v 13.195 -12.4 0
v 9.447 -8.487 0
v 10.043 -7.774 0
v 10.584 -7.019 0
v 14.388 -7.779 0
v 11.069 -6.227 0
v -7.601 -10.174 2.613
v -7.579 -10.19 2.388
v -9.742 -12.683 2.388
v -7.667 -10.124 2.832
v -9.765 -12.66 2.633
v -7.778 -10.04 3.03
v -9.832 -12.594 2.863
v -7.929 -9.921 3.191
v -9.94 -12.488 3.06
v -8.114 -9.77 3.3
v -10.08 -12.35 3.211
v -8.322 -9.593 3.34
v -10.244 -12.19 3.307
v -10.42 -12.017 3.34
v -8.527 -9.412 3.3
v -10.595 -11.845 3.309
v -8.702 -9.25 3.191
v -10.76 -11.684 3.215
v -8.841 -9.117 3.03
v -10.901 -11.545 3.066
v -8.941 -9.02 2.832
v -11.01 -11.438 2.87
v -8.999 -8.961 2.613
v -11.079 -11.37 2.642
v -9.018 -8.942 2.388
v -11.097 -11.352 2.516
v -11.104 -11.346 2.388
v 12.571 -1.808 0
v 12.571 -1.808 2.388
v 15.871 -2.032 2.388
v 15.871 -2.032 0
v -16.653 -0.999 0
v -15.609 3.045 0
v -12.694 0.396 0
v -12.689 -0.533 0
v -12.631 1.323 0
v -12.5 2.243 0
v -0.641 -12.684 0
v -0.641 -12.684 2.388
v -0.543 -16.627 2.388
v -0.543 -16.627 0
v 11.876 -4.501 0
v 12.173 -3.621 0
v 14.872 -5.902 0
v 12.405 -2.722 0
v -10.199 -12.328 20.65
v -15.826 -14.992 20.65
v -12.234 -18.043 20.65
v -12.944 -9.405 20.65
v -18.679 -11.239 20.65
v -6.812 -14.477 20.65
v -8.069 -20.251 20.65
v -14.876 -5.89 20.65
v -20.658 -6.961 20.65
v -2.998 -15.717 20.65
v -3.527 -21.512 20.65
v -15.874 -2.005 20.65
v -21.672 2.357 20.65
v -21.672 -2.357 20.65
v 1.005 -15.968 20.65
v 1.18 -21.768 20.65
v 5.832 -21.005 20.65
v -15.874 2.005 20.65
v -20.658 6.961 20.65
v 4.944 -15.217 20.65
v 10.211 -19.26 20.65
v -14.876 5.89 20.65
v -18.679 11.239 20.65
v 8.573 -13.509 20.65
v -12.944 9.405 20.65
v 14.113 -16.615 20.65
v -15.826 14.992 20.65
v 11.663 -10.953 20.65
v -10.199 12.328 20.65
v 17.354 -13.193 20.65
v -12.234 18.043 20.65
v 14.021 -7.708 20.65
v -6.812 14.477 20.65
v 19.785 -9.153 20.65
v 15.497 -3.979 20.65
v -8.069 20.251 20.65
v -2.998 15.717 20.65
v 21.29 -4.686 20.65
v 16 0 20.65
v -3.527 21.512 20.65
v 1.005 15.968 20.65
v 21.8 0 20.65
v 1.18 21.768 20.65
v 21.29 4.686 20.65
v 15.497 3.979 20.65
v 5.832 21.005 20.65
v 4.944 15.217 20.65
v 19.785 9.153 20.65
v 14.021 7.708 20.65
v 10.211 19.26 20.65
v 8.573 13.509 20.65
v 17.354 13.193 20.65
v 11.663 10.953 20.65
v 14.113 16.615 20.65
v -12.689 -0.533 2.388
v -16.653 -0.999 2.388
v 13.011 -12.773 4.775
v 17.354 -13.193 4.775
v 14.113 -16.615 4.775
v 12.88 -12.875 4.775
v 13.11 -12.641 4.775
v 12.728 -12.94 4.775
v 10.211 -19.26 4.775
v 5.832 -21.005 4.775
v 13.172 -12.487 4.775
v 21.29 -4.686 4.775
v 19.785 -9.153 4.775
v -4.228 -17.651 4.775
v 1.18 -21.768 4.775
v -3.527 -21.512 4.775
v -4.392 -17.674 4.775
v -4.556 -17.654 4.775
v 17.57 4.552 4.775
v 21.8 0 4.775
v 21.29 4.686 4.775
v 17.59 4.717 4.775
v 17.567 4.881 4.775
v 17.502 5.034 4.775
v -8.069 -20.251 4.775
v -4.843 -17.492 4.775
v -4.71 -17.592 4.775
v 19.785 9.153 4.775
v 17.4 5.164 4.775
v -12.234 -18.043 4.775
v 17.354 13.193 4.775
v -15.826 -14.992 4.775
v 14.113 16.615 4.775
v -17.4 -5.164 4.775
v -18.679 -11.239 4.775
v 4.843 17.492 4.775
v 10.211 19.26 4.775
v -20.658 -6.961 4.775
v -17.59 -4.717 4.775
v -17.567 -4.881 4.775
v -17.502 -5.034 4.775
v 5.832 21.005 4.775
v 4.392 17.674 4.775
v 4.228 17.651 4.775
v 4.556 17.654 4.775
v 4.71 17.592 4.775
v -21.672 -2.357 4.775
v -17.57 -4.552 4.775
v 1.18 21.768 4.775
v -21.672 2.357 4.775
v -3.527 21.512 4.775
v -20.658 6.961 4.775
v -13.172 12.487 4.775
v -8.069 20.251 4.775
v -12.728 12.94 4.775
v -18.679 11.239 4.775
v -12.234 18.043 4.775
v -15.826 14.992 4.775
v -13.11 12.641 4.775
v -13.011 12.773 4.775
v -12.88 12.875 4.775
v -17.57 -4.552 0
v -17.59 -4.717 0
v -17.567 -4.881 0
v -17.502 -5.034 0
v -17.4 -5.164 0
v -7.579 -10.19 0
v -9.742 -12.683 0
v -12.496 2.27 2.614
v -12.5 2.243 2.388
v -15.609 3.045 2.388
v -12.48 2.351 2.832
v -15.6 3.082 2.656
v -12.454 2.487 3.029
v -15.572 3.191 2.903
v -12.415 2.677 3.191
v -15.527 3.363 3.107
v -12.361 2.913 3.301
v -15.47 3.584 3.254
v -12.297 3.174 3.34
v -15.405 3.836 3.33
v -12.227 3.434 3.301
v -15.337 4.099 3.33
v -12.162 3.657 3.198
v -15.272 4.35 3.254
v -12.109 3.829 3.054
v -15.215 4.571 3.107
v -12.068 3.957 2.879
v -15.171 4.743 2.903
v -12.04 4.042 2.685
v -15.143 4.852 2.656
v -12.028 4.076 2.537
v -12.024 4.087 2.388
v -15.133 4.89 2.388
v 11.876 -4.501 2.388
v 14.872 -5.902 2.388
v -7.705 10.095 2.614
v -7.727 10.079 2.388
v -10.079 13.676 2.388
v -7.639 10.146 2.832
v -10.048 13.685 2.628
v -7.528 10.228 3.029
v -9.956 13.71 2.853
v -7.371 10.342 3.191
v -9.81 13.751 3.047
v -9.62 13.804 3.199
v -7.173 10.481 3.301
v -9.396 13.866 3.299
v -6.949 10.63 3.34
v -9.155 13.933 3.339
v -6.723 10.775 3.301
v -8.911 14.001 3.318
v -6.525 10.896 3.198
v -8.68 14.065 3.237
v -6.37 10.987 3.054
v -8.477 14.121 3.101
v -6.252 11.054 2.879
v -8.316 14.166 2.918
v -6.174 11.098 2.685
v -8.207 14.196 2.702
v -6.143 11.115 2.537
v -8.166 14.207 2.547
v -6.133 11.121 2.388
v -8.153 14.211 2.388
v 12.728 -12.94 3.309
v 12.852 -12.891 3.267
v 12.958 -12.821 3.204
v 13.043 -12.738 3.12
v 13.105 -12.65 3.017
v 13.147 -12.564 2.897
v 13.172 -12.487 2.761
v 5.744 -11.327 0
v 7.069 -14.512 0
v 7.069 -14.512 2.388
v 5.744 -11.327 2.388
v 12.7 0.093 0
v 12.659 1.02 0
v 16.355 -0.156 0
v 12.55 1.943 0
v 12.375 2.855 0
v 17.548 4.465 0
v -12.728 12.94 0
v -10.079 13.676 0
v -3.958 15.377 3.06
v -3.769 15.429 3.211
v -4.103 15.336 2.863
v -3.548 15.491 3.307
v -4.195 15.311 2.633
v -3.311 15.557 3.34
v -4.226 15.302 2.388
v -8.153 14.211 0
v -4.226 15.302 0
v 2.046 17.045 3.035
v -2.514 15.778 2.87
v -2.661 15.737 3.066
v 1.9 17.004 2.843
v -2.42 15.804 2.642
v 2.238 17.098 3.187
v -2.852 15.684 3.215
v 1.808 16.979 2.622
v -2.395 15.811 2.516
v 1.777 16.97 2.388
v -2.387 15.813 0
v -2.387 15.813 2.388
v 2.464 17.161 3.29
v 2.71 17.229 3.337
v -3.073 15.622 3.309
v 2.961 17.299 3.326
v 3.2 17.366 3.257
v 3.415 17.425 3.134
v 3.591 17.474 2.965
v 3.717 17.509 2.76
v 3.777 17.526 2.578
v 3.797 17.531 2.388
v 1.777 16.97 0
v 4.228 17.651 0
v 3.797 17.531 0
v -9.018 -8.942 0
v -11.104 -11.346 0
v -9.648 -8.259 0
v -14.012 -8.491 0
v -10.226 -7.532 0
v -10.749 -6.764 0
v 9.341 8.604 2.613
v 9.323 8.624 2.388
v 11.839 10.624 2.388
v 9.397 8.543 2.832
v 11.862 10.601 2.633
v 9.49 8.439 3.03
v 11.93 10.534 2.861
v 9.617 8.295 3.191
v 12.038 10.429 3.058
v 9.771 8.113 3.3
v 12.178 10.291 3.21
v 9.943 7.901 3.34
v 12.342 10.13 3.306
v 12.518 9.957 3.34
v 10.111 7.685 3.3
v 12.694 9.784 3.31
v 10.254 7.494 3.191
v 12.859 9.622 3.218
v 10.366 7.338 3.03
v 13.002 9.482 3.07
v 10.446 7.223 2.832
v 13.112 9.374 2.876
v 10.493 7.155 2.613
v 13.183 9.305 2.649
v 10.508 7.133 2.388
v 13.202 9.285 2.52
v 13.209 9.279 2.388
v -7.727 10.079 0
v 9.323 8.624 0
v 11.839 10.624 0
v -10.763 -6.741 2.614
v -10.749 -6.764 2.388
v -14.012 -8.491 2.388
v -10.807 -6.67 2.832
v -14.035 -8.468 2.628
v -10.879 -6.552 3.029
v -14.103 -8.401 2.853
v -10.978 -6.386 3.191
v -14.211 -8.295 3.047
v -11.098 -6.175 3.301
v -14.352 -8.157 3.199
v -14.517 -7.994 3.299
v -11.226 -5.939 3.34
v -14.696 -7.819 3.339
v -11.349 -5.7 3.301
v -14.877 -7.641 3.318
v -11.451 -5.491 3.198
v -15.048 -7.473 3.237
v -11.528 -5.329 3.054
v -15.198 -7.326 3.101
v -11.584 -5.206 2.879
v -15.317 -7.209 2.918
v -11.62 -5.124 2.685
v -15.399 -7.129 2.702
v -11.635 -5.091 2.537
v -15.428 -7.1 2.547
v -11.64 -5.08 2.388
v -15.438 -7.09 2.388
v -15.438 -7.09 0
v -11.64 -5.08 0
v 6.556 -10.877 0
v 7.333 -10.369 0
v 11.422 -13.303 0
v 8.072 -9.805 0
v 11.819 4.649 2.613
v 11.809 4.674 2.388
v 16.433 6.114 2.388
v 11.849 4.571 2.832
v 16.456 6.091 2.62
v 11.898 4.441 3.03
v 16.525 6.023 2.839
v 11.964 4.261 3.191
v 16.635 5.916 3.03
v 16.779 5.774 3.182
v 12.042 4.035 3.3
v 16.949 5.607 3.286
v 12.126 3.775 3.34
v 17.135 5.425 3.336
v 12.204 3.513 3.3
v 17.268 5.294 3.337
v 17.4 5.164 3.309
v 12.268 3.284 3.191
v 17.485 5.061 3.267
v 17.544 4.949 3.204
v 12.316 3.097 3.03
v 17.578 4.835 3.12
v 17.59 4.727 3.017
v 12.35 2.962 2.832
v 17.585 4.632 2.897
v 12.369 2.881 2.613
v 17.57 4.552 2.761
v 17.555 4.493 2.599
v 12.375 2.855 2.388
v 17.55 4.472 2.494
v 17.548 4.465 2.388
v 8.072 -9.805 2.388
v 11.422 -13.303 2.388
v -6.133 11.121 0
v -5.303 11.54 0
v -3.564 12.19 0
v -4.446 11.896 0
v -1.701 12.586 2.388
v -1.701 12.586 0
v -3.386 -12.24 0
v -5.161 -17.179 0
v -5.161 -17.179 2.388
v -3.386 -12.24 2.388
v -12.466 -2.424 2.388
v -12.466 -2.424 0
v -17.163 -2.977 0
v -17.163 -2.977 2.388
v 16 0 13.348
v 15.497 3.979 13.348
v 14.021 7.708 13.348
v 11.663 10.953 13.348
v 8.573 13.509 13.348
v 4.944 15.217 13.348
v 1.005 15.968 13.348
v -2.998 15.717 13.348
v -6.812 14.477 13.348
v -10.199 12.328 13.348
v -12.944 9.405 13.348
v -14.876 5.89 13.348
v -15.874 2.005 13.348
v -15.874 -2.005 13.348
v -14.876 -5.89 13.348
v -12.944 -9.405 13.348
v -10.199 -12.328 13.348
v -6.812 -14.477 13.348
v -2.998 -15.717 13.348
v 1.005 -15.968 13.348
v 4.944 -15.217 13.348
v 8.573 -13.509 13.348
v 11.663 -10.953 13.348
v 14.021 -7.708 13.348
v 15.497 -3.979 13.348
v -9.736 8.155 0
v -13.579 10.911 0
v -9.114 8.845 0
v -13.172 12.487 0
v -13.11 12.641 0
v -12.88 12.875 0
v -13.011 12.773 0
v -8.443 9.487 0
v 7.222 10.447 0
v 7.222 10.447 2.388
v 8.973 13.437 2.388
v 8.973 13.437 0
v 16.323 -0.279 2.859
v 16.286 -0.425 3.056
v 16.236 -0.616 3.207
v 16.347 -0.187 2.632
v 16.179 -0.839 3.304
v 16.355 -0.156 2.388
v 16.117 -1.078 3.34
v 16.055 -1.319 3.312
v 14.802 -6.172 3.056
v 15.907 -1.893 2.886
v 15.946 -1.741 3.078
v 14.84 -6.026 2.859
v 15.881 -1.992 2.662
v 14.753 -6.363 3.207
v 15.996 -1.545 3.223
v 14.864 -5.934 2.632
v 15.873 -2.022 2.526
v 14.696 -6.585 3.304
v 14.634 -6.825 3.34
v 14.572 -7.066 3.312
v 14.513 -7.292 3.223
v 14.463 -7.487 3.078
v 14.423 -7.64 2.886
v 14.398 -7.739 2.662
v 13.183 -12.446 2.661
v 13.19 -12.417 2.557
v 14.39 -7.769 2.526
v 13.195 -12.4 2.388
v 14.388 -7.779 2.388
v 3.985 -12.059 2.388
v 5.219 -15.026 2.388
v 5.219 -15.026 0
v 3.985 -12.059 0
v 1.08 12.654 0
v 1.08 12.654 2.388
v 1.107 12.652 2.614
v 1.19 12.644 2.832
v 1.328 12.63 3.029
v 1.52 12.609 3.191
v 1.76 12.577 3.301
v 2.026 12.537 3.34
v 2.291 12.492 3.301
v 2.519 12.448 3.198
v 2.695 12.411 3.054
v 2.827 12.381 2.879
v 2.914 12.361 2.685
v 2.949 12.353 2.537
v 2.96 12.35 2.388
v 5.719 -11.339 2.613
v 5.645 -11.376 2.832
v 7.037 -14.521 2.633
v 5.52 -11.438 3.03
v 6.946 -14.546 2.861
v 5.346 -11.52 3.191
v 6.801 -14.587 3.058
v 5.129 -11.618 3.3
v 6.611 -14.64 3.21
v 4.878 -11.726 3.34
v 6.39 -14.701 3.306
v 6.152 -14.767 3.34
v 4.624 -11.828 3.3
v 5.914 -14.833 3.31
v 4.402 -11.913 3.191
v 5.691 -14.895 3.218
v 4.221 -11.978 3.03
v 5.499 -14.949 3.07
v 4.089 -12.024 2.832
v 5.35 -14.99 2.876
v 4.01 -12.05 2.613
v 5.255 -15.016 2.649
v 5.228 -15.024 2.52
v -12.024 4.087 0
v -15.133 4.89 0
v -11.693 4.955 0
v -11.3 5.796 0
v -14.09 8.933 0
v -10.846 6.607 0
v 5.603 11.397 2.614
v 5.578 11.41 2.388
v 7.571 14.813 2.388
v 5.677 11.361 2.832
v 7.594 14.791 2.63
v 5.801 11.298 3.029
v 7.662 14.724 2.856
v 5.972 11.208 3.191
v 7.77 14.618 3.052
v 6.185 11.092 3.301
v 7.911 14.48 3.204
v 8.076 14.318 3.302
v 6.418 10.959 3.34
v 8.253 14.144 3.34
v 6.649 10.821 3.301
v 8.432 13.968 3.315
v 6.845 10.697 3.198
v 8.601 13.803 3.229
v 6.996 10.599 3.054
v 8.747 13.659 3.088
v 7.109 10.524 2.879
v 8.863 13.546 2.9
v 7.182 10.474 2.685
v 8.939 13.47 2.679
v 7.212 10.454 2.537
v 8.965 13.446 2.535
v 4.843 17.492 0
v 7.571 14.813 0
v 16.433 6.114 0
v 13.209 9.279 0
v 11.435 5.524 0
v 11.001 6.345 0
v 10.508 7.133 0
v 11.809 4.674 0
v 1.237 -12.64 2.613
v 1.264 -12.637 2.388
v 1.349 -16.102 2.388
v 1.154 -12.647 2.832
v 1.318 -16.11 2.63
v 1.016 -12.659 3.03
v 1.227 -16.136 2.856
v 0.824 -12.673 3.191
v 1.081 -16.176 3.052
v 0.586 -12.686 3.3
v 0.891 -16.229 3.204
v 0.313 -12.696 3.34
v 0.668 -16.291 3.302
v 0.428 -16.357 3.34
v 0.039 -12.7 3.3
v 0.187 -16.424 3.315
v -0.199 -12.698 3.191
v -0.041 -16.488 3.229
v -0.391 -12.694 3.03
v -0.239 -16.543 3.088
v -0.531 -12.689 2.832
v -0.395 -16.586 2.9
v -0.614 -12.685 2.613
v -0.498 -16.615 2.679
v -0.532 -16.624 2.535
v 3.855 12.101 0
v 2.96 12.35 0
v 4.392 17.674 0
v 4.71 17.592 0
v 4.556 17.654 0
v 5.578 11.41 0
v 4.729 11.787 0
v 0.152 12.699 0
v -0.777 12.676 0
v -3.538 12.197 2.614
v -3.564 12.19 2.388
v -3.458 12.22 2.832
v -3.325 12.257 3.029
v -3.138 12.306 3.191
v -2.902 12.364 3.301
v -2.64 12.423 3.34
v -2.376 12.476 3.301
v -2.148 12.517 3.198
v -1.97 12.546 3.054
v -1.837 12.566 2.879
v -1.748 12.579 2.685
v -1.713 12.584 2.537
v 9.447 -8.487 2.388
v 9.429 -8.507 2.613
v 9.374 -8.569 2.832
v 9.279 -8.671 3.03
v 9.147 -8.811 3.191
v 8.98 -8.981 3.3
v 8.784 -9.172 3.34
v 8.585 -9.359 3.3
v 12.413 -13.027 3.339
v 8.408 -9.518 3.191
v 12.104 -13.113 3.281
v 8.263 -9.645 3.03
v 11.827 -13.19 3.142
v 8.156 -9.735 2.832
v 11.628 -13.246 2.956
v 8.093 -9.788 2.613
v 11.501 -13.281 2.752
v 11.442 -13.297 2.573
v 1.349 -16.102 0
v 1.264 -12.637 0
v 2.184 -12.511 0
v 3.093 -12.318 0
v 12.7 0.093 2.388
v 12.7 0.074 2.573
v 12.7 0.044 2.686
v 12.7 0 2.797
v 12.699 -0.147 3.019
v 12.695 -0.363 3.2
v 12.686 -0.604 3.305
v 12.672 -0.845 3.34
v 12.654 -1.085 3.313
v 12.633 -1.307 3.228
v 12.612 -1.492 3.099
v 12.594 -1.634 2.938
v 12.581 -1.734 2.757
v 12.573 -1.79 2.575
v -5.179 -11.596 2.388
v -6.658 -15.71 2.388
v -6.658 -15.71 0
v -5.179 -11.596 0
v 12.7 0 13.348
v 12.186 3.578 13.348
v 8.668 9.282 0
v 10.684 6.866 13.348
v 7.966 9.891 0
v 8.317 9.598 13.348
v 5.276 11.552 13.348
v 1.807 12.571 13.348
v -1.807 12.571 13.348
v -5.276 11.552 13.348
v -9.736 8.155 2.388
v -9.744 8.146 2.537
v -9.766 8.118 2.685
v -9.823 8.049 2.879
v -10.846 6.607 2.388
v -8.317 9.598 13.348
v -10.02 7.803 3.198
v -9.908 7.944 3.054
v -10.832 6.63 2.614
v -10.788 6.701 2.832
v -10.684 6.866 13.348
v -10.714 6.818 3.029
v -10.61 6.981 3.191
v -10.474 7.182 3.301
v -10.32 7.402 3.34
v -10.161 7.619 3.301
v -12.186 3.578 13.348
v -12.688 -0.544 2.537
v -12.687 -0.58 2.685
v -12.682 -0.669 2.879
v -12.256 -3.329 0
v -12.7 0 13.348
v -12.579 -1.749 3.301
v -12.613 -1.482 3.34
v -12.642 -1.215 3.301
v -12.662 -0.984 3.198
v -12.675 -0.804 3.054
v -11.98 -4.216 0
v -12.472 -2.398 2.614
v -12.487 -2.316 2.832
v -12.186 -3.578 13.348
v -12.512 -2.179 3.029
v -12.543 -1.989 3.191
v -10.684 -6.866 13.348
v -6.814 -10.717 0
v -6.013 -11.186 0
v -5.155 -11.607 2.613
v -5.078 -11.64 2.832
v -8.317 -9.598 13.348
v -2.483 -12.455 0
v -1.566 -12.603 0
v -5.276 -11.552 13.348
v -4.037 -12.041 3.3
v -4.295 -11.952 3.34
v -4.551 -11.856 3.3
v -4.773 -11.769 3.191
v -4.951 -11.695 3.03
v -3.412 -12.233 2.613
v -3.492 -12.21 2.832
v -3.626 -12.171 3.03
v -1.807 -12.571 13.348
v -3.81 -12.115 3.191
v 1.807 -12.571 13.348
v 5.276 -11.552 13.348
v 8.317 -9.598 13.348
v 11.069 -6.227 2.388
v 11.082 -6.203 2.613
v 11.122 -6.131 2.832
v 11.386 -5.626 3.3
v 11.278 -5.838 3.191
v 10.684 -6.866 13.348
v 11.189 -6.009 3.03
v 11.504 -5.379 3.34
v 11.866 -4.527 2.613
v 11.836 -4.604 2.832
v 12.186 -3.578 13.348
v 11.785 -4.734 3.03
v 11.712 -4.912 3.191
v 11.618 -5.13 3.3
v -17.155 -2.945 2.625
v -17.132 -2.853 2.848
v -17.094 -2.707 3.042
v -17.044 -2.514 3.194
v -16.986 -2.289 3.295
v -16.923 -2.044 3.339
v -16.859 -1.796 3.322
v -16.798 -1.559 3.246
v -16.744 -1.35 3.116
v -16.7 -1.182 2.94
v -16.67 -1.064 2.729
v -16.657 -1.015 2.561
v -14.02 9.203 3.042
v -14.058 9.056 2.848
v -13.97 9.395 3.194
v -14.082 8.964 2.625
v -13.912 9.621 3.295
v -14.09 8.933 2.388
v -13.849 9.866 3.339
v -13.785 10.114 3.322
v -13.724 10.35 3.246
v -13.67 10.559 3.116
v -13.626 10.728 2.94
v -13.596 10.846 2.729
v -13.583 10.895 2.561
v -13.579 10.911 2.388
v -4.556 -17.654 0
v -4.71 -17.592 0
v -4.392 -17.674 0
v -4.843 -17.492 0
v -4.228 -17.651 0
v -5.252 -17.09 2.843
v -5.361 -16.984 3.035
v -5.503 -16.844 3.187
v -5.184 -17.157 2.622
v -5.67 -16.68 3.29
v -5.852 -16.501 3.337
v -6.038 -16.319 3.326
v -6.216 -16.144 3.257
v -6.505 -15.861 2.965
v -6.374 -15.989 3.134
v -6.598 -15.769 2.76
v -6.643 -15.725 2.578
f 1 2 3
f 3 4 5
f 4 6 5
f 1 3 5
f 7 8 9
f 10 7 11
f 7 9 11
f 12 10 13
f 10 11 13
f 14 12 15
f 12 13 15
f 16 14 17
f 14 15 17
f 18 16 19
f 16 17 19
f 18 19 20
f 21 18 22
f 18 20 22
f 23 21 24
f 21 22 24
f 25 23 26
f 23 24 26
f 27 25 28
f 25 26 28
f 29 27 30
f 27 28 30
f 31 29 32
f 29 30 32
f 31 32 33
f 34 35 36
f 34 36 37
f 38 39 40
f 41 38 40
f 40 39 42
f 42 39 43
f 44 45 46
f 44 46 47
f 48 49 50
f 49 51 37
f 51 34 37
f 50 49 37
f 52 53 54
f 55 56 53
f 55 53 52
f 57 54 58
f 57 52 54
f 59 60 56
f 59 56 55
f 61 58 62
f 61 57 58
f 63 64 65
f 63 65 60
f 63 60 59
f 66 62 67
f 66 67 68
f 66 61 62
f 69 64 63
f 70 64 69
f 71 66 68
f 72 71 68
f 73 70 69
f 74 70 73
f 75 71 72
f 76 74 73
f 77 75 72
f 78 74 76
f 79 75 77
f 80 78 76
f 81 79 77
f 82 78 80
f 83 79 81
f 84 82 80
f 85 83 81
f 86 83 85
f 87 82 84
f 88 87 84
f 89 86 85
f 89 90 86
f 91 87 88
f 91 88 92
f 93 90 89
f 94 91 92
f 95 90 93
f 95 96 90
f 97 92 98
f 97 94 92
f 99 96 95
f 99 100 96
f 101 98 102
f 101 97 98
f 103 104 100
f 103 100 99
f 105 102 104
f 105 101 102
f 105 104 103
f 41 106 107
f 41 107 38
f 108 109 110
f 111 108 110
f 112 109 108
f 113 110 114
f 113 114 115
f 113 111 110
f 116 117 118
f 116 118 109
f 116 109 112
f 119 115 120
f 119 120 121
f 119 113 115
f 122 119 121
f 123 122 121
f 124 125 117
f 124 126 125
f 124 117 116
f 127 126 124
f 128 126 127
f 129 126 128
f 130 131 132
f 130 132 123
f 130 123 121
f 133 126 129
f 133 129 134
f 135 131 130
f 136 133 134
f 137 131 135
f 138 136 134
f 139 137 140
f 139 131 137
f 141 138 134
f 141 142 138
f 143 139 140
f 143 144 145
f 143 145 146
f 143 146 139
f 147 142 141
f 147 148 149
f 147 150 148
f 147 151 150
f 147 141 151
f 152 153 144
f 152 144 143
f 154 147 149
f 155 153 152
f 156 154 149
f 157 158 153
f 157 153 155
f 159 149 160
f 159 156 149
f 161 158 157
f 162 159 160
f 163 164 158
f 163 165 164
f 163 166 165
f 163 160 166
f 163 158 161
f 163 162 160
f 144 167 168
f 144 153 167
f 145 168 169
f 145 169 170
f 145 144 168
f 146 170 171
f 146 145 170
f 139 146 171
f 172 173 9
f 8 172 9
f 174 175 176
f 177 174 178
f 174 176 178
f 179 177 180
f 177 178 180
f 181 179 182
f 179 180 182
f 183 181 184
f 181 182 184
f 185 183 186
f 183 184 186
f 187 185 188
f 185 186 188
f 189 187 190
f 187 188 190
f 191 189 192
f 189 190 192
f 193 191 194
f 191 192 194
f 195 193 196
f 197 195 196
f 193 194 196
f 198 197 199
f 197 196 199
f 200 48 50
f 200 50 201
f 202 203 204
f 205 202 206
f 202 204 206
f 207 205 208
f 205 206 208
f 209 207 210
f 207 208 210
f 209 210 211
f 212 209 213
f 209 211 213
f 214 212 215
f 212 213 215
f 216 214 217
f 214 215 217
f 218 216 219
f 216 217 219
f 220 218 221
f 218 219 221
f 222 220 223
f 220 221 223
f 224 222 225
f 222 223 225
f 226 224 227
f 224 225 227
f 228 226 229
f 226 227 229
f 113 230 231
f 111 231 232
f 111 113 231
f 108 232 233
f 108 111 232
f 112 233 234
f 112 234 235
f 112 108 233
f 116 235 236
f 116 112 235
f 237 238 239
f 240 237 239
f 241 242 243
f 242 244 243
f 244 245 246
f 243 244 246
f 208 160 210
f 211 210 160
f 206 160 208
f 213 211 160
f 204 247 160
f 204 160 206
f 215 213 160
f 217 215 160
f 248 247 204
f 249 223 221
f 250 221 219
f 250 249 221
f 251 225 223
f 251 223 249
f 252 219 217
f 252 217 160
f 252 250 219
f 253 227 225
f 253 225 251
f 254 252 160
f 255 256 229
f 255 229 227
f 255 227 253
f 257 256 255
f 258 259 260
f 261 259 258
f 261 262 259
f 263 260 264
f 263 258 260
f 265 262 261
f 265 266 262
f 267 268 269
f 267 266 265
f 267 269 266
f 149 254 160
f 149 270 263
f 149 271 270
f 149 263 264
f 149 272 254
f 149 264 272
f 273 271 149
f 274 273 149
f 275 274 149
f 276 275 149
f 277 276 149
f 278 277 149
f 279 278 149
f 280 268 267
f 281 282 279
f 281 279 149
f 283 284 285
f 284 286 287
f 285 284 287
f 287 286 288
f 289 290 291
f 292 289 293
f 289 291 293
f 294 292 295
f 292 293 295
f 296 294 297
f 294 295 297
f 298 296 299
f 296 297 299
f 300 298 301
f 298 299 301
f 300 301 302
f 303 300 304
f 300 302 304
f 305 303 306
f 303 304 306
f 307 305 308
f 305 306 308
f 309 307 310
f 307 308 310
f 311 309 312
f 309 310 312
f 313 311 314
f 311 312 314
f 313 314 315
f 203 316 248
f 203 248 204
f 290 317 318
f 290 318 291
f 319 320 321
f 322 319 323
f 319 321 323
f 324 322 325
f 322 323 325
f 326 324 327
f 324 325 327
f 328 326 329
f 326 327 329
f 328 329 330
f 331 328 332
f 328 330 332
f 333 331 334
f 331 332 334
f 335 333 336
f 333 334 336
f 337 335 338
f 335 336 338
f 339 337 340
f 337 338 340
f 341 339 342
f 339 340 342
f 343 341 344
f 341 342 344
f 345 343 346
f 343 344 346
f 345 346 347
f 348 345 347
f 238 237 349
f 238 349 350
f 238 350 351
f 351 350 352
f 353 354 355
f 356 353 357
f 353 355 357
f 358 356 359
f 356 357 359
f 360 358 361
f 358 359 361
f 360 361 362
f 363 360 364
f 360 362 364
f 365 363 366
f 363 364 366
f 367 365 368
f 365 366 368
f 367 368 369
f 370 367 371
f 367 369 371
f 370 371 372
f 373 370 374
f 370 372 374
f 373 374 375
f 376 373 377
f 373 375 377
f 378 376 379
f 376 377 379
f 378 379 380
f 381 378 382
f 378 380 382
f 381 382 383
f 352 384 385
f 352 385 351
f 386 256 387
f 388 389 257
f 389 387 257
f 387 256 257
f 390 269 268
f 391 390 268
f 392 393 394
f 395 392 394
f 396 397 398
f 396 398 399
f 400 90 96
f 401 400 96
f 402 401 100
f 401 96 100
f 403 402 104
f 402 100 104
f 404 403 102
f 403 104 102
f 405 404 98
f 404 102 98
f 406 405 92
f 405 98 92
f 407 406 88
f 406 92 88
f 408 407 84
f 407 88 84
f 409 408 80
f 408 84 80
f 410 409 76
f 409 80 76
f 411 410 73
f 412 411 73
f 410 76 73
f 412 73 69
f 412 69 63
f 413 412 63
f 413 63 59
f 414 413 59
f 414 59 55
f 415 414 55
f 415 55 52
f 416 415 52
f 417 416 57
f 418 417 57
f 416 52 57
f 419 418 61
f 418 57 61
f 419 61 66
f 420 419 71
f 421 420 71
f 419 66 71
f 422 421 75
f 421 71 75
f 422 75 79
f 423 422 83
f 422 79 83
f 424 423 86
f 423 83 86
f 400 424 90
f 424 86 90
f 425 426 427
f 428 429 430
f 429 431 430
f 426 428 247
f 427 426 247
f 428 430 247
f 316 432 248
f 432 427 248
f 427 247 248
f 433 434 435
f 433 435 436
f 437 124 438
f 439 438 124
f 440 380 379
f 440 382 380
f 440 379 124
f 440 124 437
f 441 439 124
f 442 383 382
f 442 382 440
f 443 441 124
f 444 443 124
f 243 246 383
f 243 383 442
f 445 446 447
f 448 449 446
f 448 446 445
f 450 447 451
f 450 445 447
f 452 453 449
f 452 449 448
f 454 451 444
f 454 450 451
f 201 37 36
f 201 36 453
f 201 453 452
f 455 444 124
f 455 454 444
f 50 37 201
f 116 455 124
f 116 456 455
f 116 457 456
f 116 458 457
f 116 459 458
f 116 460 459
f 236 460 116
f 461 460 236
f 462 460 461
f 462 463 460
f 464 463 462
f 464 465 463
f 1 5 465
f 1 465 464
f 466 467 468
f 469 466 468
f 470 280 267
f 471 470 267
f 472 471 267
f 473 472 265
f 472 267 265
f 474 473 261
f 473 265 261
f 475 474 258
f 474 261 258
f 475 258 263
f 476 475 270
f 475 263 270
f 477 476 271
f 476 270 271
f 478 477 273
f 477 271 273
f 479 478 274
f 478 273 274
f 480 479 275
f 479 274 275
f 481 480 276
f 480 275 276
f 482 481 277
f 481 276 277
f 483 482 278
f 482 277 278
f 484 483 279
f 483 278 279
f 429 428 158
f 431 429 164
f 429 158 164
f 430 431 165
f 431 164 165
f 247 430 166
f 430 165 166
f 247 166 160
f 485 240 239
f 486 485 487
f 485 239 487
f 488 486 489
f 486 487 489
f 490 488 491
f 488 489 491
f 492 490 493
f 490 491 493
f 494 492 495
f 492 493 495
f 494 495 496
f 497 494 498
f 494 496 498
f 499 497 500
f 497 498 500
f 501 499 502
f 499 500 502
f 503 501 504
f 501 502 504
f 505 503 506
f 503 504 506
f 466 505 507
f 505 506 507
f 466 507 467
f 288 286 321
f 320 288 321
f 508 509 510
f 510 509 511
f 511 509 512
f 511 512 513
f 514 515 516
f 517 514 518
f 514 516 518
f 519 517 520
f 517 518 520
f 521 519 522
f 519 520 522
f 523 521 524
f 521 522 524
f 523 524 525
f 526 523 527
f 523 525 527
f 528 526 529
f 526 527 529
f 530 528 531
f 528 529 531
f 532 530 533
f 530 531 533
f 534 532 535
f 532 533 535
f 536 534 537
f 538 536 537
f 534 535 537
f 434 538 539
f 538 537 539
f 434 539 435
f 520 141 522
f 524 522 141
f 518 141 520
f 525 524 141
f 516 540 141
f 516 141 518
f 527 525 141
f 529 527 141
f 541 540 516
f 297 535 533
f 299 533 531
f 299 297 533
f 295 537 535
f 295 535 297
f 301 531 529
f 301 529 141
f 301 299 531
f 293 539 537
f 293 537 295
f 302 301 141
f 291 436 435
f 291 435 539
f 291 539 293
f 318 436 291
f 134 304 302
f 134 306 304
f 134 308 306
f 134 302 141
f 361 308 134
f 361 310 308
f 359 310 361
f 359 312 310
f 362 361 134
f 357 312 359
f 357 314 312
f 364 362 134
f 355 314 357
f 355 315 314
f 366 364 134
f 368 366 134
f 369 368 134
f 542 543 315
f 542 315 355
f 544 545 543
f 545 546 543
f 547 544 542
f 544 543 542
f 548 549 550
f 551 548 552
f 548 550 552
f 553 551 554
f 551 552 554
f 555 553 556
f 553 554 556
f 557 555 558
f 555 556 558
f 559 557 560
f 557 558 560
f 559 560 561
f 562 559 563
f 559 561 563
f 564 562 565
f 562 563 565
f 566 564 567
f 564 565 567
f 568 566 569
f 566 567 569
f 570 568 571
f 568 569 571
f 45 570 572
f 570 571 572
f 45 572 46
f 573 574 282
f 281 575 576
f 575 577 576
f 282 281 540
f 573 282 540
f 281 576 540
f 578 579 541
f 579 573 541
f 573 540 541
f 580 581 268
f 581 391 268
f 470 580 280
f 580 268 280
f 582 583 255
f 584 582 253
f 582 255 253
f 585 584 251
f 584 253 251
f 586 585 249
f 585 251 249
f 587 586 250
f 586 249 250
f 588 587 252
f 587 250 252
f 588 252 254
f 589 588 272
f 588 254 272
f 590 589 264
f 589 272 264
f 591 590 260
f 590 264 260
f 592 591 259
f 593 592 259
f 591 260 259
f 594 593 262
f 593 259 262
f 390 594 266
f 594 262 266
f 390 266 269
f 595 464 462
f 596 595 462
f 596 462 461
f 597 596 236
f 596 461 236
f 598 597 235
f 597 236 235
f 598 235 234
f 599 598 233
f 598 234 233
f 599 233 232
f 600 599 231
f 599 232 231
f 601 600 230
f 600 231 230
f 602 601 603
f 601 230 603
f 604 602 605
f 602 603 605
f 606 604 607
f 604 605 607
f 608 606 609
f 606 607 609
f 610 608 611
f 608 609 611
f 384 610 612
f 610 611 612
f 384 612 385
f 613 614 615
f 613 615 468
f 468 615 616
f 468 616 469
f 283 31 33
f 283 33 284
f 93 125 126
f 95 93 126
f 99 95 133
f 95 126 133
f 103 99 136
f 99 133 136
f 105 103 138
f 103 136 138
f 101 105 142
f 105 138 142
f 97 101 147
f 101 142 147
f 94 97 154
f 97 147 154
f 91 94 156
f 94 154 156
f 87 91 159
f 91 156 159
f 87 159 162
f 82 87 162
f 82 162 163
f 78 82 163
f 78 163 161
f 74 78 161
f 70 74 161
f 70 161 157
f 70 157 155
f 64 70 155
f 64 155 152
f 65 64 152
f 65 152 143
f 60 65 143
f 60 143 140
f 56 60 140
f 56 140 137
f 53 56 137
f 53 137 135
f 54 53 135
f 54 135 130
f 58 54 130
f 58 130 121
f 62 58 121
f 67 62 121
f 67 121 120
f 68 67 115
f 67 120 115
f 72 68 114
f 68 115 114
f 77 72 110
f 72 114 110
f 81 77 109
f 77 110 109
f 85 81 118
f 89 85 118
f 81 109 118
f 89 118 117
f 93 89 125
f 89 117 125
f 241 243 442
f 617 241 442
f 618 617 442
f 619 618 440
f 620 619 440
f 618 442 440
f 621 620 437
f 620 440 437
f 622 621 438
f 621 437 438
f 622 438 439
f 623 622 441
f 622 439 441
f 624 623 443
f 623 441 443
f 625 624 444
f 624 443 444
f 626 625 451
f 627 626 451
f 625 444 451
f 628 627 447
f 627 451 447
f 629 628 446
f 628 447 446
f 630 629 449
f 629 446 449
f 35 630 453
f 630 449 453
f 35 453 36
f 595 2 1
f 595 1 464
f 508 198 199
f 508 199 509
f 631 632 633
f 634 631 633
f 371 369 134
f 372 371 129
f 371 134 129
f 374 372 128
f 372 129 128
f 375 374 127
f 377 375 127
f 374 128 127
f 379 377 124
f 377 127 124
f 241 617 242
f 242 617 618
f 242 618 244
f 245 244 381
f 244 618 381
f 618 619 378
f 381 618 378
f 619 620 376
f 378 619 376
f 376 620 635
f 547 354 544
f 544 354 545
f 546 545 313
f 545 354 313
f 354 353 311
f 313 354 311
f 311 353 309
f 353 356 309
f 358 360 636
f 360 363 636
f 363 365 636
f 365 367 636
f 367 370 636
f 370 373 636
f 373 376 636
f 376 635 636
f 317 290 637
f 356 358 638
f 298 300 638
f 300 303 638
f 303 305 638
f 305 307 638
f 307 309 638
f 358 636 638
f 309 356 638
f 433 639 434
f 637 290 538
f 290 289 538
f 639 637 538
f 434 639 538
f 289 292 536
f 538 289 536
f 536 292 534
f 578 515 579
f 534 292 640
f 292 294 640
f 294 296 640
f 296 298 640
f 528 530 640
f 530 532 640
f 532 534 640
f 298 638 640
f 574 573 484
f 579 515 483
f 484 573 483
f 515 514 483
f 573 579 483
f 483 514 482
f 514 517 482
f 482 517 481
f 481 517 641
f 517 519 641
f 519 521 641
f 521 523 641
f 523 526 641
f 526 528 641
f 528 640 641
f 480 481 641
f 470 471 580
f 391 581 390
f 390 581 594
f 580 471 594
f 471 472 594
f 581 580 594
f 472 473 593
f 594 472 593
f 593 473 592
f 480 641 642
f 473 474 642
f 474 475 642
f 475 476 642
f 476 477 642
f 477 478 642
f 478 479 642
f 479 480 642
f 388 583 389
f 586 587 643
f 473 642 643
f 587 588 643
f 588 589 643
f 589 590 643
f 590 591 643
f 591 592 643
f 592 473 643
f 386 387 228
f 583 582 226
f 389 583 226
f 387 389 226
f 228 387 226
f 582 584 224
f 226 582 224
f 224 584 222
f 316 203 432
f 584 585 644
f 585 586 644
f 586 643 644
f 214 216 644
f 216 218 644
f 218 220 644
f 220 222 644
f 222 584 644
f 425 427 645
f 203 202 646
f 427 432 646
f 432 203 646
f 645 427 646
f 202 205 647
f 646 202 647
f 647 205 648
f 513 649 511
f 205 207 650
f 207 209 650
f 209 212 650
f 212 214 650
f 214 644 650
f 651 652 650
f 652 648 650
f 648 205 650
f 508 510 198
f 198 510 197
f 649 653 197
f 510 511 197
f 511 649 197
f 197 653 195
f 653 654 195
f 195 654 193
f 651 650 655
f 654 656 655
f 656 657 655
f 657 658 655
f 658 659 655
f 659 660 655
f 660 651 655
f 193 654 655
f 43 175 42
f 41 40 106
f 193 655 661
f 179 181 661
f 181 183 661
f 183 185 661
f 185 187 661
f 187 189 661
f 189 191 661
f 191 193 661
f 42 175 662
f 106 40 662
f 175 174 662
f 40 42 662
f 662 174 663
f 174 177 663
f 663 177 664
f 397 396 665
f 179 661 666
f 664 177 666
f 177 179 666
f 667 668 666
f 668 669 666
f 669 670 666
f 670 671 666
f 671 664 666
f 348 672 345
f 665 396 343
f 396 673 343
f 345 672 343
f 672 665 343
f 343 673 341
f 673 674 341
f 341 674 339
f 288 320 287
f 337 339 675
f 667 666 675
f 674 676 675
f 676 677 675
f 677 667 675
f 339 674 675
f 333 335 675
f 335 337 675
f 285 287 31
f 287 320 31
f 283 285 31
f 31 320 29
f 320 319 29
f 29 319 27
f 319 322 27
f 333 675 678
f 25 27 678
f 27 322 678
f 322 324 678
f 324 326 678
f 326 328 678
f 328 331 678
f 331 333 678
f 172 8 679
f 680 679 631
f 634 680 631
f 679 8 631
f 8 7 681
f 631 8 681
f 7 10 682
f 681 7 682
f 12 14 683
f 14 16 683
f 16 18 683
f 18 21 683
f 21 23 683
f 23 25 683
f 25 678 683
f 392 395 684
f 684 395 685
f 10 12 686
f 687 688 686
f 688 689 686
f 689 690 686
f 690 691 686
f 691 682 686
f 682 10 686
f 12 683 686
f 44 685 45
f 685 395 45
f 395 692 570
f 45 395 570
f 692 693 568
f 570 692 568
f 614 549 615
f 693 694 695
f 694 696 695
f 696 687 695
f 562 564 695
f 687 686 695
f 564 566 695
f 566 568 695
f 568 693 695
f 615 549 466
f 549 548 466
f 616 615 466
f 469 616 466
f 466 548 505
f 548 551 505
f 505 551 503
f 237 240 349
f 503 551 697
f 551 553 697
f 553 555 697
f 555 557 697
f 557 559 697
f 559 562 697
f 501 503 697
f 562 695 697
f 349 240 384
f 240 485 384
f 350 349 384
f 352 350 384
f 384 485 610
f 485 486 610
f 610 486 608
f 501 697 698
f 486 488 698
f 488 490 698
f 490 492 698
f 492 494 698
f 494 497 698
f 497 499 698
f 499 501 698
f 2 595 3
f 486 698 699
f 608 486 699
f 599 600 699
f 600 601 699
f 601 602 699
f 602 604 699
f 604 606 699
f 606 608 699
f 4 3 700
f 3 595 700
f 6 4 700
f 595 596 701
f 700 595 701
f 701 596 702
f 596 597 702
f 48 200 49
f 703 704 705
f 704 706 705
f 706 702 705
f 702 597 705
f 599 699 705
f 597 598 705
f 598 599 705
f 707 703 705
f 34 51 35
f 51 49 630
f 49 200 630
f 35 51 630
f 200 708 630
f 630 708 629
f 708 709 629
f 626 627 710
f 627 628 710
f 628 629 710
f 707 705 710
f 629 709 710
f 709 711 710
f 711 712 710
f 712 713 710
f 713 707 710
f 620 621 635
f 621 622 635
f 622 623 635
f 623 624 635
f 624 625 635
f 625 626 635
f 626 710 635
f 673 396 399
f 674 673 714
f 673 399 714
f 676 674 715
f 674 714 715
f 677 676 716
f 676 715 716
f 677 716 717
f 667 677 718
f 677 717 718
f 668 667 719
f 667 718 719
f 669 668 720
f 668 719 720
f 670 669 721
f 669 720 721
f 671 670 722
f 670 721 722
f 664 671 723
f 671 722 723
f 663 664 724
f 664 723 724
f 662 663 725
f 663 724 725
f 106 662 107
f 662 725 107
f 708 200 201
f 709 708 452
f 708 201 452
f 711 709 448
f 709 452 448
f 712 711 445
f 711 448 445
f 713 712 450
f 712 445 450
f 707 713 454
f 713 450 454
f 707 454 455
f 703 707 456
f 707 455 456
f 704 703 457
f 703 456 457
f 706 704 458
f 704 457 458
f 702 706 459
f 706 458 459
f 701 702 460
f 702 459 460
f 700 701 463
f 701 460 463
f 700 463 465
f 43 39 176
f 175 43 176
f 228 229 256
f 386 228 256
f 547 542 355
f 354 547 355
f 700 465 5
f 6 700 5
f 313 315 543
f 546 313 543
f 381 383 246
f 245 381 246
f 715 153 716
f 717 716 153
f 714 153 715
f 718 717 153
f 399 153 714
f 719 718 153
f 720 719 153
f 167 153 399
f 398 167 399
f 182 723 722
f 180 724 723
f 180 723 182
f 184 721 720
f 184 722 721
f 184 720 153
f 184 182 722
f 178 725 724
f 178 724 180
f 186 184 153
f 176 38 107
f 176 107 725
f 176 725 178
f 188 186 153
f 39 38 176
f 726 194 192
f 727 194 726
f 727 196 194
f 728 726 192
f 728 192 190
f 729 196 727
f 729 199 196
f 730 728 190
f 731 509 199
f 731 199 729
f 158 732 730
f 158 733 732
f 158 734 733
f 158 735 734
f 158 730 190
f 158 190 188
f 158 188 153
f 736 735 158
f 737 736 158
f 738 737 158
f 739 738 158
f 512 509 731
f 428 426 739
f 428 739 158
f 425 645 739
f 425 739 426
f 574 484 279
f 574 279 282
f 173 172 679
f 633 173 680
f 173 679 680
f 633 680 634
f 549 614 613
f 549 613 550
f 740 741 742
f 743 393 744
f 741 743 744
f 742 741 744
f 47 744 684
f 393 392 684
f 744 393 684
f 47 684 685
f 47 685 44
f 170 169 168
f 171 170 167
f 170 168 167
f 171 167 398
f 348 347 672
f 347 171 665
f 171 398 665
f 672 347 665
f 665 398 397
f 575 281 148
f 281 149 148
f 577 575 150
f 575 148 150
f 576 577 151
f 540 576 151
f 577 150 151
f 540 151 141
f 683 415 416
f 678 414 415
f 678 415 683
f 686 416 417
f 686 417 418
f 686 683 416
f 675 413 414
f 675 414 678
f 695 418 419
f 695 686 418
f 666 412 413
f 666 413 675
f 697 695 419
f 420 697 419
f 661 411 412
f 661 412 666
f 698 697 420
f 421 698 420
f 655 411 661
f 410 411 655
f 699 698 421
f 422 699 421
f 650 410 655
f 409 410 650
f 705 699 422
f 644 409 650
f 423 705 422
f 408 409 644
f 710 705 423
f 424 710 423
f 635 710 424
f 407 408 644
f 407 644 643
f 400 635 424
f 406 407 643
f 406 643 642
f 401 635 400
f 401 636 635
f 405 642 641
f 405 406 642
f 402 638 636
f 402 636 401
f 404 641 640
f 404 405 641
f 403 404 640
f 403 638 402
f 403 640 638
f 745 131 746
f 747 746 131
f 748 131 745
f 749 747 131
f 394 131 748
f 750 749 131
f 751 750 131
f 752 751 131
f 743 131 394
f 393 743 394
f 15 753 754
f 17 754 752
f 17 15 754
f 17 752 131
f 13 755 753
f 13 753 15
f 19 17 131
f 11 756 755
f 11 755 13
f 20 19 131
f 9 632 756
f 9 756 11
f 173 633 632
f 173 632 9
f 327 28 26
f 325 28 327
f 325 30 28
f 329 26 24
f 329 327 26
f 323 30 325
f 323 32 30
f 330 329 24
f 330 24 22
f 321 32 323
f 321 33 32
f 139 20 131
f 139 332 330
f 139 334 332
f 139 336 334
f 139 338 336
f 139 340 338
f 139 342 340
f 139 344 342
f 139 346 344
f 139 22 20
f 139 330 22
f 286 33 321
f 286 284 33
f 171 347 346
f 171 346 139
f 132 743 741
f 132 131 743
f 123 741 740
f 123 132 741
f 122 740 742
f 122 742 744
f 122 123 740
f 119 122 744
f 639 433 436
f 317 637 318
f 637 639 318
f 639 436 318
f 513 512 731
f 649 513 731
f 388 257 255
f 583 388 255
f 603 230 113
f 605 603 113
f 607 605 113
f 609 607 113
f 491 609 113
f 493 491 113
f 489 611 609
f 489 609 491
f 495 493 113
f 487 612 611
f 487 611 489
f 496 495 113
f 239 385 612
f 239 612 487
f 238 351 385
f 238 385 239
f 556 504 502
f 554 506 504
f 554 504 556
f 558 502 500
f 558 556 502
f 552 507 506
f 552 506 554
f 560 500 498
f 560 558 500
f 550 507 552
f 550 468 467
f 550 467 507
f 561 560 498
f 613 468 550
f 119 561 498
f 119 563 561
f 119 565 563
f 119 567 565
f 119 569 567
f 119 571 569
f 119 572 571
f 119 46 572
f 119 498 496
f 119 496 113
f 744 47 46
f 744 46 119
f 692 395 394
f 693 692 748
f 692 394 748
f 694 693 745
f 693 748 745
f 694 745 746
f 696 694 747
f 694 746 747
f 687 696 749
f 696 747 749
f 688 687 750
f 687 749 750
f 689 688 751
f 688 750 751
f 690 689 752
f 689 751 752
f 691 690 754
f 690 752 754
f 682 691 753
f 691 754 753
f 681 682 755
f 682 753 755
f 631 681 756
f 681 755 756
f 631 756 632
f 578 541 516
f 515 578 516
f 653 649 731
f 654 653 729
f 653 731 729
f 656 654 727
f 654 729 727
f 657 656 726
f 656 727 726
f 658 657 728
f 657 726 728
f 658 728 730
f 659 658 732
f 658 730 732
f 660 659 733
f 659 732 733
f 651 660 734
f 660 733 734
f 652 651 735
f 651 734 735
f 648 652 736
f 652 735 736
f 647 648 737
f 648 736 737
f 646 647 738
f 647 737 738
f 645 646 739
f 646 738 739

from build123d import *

# Parameters (mm, degrees)
SKETCH1_R           = 21.79955
BOSS_EXTRUDE1_DEPTH = 20.6502
SKETCH2_R           = 12.7
CUT_EXTRUDE1_DEPTH  = 20.6502
SKETCH3_R           = 16.000000004
CUT_EXTRUDE2_DEPTH  = 7.3025
SKETCH4_OUTSIDE_W   = 58.604
SKETCH4_OUTSIDE_H   = 58.604
CUT_EXTRUDE3_DEPTH  = 4.7752
CUT_EXTRUDE4_DEPTH  = 9.8552
CIRPATTERN1_COUNT   = 17
FILLET1_R           = 0.635


with BuildPart() as part:
    # Sketch1 → Boss-Extrude1 (new body)
    with BuildSketch(Plane.XY):
        Circle(SKETCH1_R)
    extrude(amount=BOSS_EXTRUDE1_DEPTH)

    # Sketch2 → Cut-Extrude1 (cut)
    with BuildSketch(Plane.XY.offset(20.6502)):
        Circle(SKETCH2_R)
    extrude(amount=-CUT_EXTRUDE1_DEPTH, mode=Mode.SUBTRACT)

    # Sketch3 → Cut-Extrude2 (cut)
    with BuildSketch(Plane.XY.offset(20.6502)):
        Circle(SKETCH3_R)
    extrude(amount=-CUT_EXTRUDE2_DEPTH, mode=Mode.SUBTRACT)

    # Sketch4 outside → Cut-Extrude3 (cut)
    with BuildSketch(Plane(origin=(0, 0, 0), x_dir=(-1, 0, 0), z_dir=(0, 0, -1))):
        Rectangle(SKETCH4_OUTSIDE_W, SKETCH4_OUTSIDE_H)
        Polygon((17.661795398, -4.907322758), (13.080763872, 12.841902112), (-4.581031526, 17.74922487), (-17.661795398, 4.907322758), (-13.080763872, -12.841902112), (4.581031526, -17.74922487), align=None, mode=Mode.SUBTRACT)
    extrude(amount=-CUT_EXTRUDE3_DEPTH, mode=Mode.SUBTRACT)

    # Sketch5 → Cut-Extrude4 (cut, symmetric)
    with BuildSketch(Plane(origin=(-15.371279635, 3.967289677, 0), x_dir=(0, 0, 1), z_dir=(-0.9682695833030739, 0.24990801117629627, 0))):
        with BuildLine():
            Line((2.3876, 0.9525), (0, 0.9525))
            Line((0, 0.9525), (0, -0.9525))
            Line((0, -0.9525), (2.3876, -0.9525))
            ThreePointArc((2.3876, -0.9525), (3.3401, 0), (2.3876, 0.9525))
        make_face()
    cut_extrude4 = extrude(amount=CUT_EXTRUDE4_DEPTH, both=True, mode=Mode.SUBTRACT)

    # CirPattern1: Cut-Extrude4 ×17 about axis
    cirpattern1_axis = Axis((0, 0, 13.3477), (0, 0, 1))
    for i in range(1, CIRPATTERN1_COUNT):
        add(cut_extrude4.rotate(cirpattern1_axis, i * 360 / CIRPATTERN1_COUNT), mode=Mode.SUBTRACT)

    # Fillet1
    fillet1_edges = [part.edges().sort_by_distance(p)[0] for p in [
        (-17.661795398, -4.907322758, 2.3876),
        (-13.080763872, 12.841902112, 2.3876),
        (4.581031526, 17.74922487, 2.3876),
        (17.661795398, 4.907322758, 3.964999961),
        (13.080763872, -12.841902112, 3.964999961),
        (-4.581031526, -17.74922487, 2.3876),
    ]]
    fillet(fillet1_edges, radius=FILLET1_R)


solid = part.part
